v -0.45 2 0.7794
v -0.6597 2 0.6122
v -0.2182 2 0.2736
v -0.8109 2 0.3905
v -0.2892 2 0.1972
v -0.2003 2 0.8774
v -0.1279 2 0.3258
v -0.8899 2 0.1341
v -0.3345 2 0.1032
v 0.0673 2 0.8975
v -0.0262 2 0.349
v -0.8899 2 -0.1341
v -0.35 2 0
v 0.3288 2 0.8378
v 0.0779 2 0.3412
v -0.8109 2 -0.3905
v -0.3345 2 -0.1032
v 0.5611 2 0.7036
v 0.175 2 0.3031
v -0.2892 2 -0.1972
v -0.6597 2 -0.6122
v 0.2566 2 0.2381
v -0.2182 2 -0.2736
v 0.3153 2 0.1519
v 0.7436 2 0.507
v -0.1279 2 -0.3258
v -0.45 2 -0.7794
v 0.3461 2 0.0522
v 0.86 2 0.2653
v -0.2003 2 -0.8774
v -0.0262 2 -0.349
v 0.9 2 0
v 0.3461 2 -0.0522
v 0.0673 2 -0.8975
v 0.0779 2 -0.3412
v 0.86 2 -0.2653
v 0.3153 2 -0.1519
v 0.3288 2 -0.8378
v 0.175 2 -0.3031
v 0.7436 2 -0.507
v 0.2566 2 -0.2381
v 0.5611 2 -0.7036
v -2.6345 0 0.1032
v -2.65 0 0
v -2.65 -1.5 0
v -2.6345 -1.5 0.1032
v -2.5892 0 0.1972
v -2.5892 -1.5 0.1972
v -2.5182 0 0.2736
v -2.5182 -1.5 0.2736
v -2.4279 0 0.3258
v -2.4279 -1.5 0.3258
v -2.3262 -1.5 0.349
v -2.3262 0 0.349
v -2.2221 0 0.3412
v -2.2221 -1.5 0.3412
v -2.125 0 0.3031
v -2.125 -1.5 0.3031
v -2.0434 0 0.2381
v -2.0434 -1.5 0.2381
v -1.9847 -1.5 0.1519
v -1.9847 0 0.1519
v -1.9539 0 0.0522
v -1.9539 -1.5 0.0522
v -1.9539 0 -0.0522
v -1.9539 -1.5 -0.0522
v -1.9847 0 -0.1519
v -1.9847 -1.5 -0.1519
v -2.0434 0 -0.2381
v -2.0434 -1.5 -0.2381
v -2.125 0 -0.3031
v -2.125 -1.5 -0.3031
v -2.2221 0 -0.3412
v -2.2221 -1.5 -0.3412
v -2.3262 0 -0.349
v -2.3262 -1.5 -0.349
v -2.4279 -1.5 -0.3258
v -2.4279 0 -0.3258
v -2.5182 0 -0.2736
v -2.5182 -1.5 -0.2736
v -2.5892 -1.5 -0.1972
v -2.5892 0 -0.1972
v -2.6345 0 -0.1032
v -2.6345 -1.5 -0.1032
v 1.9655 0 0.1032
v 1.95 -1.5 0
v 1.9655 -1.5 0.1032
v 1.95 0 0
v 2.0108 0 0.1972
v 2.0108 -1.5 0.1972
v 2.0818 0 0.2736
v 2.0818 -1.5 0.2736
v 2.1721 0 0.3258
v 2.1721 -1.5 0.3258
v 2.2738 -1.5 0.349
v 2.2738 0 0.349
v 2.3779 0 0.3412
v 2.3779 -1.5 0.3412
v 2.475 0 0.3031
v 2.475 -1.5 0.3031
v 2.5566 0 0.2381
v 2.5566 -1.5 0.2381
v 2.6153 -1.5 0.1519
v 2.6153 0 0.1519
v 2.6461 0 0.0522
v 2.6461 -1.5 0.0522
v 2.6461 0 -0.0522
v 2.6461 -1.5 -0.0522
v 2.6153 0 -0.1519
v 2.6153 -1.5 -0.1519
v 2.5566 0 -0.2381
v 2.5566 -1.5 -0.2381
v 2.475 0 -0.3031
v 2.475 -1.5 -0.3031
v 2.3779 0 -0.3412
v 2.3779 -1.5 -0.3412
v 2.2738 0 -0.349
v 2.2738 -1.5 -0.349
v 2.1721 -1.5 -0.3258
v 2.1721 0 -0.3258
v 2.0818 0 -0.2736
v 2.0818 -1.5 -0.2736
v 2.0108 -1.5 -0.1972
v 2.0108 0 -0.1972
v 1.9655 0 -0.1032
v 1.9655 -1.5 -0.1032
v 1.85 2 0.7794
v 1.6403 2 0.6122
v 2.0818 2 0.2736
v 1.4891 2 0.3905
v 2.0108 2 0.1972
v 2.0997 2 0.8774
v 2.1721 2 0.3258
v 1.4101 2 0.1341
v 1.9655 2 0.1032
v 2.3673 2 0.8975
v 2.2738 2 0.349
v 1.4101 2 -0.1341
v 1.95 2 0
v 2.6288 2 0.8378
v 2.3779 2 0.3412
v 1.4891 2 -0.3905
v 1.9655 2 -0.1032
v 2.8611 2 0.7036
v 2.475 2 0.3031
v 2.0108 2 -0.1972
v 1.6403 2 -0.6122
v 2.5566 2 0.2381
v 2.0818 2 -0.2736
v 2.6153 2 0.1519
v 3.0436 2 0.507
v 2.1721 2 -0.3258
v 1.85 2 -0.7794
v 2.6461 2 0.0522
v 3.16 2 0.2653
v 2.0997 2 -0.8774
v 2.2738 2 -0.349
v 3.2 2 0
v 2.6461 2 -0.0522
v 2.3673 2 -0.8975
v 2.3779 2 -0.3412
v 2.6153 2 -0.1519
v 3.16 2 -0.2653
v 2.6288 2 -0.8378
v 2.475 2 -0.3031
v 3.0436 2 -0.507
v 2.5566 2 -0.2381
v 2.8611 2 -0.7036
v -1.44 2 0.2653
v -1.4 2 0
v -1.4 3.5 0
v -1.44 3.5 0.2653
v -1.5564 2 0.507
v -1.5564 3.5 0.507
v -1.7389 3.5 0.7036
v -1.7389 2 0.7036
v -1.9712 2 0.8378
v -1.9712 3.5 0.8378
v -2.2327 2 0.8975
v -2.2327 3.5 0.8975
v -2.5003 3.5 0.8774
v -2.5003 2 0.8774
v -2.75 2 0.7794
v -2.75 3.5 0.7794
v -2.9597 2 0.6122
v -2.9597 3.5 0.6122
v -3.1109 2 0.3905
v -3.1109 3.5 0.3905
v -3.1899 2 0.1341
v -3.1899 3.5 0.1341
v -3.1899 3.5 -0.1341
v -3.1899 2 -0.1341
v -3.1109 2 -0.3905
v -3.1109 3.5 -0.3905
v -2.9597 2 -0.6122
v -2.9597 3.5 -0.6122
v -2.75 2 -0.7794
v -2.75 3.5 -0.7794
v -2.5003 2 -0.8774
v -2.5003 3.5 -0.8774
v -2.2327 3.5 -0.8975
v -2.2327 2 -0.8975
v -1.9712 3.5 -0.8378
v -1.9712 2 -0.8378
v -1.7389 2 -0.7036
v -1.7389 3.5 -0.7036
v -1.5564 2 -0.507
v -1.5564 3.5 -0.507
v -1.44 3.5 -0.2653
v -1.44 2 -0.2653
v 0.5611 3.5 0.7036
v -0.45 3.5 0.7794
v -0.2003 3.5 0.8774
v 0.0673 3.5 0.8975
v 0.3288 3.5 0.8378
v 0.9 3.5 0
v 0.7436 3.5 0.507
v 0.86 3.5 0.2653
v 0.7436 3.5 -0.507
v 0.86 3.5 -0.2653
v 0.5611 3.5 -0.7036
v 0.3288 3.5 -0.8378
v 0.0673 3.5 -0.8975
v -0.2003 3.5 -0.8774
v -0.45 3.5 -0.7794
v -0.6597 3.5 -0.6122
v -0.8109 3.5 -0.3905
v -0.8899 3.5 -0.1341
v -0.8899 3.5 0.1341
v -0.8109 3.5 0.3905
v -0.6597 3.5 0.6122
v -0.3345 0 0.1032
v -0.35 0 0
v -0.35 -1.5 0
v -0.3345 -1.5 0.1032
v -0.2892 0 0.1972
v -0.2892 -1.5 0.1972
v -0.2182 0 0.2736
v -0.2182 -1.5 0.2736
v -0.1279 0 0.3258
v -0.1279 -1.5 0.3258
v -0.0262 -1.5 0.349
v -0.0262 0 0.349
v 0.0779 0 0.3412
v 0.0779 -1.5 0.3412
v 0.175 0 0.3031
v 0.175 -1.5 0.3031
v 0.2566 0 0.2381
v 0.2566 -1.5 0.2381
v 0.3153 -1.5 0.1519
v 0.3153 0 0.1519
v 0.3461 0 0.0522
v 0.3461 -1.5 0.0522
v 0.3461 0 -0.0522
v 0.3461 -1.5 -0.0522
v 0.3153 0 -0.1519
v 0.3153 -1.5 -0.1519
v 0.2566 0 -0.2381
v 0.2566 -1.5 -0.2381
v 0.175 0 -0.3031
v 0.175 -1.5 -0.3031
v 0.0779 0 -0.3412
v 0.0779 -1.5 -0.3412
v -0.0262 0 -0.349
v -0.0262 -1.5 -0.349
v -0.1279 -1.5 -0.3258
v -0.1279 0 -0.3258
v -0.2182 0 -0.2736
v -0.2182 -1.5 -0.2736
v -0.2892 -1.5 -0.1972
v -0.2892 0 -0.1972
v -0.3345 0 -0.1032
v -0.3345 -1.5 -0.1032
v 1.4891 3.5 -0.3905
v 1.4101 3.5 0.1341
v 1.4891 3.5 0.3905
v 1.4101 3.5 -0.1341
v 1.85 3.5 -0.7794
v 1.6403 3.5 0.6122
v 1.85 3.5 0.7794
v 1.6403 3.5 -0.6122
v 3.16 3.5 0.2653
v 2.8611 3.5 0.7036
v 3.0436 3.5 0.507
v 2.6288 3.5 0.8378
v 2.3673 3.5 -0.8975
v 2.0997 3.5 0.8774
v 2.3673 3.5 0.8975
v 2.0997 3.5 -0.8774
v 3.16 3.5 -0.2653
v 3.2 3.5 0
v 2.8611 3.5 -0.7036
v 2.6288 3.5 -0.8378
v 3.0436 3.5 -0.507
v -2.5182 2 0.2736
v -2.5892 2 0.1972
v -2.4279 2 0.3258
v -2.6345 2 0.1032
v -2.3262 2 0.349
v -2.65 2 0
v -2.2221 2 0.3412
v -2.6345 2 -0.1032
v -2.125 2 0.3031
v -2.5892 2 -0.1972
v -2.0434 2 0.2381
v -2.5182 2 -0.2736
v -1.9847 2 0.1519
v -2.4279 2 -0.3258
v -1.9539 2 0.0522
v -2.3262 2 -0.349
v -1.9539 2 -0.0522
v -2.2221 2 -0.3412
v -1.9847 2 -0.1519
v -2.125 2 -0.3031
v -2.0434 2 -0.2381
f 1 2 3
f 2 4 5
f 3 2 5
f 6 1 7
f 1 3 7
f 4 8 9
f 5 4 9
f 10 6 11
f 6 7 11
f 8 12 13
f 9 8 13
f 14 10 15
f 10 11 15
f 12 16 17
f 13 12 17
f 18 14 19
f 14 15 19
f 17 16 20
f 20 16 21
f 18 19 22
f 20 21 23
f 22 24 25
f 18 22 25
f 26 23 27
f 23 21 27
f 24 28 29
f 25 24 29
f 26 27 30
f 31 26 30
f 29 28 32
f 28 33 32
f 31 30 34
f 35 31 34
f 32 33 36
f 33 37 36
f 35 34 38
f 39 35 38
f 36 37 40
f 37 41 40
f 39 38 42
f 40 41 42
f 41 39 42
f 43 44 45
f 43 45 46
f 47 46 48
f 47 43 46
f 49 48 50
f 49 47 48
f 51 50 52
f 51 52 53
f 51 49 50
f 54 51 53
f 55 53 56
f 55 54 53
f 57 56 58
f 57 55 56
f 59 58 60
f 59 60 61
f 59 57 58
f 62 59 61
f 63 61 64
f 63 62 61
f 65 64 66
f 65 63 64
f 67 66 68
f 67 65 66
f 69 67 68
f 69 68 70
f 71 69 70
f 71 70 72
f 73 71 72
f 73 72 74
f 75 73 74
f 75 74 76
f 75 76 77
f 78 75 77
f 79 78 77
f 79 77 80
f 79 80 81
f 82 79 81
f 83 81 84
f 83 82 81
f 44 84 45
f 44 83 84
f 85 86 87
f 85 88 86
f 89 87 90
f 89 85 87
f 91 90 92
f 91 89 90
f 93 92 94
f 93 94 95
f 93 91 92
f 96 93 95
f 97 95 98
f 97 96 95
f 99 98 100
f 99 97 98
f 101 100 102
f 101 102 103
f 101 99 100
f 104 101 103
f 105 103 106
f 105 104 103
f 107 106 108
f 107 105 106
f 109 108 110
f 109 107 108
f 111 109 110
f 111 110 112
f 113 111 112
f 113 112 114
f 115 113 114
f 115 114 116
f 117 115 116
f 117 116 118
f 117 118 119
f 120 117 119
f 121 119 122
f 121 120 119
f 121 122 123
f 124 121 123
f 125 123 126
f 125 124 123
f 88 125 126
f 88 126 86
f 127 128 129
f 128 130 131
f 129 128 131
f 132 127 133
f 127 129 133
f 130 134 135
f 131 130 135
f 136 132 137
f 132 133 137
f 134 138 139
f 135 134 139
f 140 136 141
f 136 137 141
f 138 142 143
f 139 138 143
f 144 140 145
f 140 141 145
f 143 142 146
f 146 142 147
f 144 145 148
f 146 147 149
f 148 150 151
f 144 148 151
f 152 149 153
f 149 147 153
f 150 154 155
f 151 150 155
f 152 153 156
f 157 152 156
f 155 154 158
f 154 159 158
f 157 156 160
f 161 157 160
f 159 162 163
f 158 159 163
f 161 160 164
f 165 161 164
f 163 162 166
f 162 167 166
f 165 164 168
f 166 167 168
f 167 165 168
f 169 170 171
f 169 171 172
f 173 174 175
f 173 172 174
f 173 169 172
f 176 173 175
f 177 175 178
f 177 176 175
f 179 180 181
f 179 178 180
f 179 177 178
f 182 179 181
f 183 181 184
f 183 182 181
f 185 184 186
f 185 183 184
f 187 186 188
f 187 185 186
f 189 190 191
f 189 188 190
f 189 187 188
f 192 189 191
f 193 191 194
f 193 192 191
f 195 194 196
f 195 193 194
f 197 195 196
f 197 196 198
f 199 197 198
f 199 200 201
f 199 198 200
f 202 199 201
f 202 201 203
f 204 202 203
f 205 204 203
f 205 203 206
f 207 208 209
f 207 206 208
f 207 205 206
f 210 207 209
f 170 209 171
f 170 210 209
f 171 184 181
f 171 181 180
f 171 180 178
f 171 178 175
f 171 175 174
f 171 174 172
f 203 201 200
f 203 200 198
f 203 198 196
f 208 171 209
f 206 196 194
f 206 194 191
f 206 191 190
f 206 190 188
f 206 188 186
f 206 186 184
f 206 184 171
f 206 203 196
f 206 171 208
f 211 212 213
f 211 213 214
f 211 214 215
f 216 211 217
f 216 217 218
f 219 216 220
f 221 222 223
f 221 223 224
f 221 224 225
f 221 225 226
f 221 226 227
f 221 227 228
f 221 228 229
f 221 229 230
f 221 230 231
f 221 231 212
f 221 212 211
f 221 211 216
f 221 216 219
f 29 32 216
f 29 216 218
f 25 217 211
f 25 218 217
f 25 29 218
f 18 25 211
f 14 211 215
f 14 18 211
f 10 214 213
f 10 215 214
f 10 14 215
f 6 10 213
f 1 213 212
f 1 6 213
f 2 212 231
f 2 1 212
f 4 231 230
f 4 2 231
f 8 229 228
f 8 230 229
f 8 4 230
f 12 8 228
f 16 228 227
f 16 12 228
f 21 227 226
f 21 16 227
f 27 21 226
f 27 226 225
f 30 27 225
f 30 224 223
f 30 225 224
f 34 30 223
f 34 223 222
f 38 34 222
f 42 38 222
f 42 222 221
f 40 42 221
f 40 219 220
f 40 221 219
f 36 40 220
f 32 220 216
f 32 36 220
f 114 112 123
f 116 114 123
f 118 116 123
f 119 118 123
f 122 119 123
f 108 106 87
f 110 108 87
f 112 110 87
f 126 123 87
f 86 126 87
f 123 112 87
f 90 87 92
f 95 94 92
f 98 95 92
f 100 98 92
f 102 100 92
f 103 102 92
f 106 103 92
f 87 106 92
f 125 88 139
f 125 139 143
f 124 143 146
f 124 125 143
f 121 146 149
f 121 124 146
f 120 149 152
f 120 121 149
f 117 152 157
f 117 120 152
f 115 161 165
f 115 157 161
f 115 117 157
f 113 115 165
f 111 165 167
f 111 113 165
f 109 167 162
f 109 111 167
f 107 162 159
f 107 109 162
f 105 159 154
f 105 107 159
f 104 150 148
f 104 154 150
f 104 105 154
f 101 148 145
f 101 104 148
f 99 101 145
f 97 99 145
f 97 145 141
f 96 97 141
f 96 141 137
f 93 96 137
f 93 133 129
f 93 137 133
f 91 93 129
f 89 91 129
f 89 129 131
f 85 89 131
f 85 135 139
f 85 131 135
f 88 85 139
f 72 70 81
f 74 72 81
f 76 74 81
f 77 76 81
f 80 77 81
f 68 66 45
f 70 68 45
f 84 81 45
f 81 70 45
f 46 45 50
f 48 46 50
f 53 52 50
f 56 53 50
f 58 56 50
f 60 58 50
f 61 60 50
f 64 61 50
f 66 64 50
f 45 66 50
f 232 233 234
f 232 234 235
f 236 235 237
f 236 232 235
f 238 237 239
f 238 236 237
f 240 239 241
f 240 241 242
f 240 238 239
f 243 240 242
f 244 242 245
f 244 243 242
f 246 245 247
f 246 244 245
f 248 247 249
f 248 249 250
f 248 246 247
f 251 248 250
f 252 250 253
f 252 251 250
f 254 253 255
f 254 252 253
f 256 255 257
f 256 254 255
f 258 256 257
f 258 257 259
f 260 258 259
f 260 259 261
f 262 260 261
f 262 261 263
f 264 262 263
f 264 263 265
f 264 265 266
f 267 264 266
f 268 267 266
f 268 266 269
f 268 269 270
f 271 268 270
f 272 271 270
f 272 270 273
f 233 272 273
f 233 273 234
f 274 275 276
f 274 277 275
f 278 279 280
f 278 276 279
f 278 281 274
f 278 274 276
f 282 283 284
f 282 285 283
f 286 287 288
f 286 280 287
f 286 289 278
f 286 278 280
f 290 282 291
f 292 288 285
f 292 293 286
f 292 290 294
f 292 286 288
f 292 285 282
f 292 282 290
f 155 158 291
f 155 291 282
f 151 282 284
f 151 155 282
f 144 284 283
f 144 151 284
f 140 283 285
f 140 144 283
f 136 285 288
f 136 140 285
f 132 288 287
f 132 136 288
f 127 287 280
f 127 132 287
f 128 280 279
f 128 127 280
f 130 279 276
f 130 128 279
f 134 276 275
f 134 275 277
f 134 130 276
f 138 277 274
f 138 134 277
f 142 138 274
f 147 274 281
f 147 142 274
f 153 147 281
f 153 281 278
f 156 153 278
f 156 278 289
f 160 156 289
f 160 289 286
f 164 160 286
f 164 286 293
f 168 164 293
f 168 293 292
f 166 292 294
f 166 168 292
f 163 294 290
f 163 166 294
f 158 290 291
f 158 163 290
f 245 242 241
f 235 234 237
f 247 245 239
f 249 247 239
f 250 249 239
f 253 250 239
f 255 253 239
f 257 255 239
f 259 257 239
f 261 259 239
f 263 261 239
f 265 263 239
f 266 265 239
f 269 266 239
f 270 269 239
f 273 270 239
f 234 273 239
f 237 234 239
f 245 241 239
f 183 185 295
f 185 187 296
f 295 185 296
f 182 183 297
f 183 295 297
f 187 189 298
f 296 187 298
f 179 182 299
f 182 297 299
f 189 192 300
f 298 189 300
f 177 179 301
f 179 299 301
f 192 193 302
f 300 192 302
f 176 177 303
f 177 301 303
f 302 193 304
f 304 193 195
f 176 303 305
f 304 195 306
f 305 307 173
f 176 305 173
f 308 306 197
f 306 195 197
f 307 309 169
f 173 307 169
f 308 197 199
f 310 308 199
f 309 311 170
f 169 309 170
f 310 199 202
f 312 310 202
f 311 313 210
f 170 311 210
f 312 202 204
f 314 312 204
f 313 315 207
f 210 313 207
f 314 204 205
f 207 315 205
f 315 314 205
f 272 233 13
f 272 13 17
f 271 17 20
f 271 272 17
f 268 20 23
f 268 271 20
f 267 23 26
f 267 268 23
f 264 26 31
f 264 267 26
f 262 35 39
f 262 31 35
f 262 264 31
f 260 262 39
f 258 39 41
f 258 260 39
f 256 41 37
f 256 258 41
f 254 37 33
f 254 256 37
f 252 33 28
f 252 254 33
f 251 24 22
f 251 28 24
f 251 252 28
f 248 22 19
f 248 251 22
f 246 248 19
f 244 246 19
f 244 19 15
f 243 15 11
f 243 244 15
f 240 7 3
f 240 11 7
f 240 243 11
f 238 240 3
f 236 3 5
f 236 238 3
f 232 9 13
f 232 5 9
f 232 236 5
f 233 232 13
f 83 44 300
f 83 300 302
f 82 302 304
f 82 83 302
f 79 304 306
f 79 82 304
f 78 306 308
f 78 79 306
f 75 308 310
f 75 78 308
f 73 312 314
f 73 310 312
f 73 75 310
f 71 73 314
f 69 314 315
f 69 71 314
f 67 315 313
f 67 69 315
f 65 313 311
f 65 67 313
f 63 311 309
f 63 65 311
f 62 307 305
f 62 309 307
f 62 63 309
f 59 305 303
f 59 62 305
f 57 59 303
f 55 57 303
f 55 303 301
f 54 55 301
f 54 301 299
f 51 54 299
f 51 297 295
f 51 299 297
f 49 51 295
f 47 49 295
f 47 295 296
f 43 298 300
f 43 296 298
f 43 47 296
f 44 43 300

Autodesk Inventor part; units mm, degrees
ref_plane "YZ Plane" through (0, 0, 0) normal (1, 0, 0) x (0, 1, 0)
ref_plane "XZ Plane" through (0, 0, 0) normal (0, 1, 0) x (-1, 0, 0)
ref_plane "XY Plane" through (0, 0, 0) normal (0, 0, 1) x (1, 0, 0)
sketch "Sketch1" plane through (0, 0, 0) normal (0, 1, 0) x (-1, 0, 0)
  line L0 (-5.4, 3.15) -> (5.4, 3.15)
  line L1 (8.55, 0) -> (8.55, 0)
  line L2 (5.4, -3.15) -> (-5.4, -3.15)
  line L3 (-8.55, 0) -> (-8.55, 0)
  line L4 (-8.55, 3.15) -> (8.55, -3.15) construction
  line L5 (8.55, 3.15) -> (-8.55, -3.15) construction
  arc A0 (8.55, 0) -> (5.4, 3.15) centre (5.4, 0) ccw
  arc A1 (5.4, -3.15) -> (8.55, 0) centre (5.4, 0) ccw
  arc A2 (-5.4, 3.15) -> (-8.55, 0) centre (-5.4, 0) ccw
  arc A3 (-8.55, 0) -> (-5.4, -3.15) centre (-5.4, 0) ccw
  line L6 (5.4, 2.3494) -> (-5.4, 2.3494)
  line L7 (-7.75, -0.0006) -> (-7.75, 0.0006)
  line L8 (-5.4, -2.3494) -> (5.4, -2.3494)
  line L9 (7.75, 0.0006) -> (7.75, -0.0006)
  line L10 (7.75, 2.3494) -> (-7.75, -2.3494) construction
  line L11 (-7.75, 2.3494) -> (7.75, -2.3494) construction
  arc A4 (-5.4, 2.3494) -> (-7.75, -0.0006) centre (-5.4, -0.0006) ccw
  arc A5 (-7.75, 0.0006) -> (-5.4, -2.3494) centre (-5.4, 0.0006) ccw
  arc A6 (7.75, -0.0006) -> (5.4, 2.3494) centre (5.4, -0.0006) ccw
  arc A7 (5.4, -2.3494) -> (7.75, 0.0006) centre (5.4, 0.0006) ccw
  circle A8 centre (5.4, 0.0006) radius 1.5
  circle A9 centre (-5.4, 0.0006) radius 1.5
  circle A10 centre (2.3, 0) radius 0.9
  circle A11 centre (0, 0) radius 0.9
  circle A12 centre (-2.3, 0) radius 0.9
  circle A13 centre (2.3, 0) radius 0.35
  circle A14 centre (0, 0) radius 0.35
  circle A15 centre (-2.3, 0) radius 0.35
  point P0 (0, 0)
  dimension "d0" = 17.1
  dimension "d1" = 6.3
  dimension "d2" = 3.15
  dimension "d3" = 0.801
  dimension "d4" = 0.8
  dimension "d5" = 2.35
  dimension "d6" = 3
  dimension "d7" = 3
  dimension "d8" = 1.8
  dimension "d9" = 1.8
  dimension "d10" = 1.8
  dimension "d11" = 4.6
  dimension "d12" = 0.7
  dimension "d13" = 0.7
  dimension "d14" = 0.7
extrude "Extrusion1" add sketch "Sketch1" along normal blind 2 and the other way blind 1.5 contours A13 | A14 | A15
sketch "Sketch2" plane through (-2.3, 2, 0) normal (0, 1, 0) x (1, 0, 0)
  circle A0 centre (0, 0) radius 0.9
  circle A1 centre (2.3, 0) radius 0.9
  line L0 (2.3, 0) -> (4.6, 0)
  circle A2 centre (4.6, 0) radius 0.9
  dimension "d21" = 1.8
  dimension "d22" = 1.8
  dimension "d23" = 2.3
  dimension "d24" = 1.8
  dimension "d25" = 2.3
extrude "Extrusion2" add sketch "Sketch2" along normal blind 1.5
properties part number "Pogo_Pin1" material "Copper"
